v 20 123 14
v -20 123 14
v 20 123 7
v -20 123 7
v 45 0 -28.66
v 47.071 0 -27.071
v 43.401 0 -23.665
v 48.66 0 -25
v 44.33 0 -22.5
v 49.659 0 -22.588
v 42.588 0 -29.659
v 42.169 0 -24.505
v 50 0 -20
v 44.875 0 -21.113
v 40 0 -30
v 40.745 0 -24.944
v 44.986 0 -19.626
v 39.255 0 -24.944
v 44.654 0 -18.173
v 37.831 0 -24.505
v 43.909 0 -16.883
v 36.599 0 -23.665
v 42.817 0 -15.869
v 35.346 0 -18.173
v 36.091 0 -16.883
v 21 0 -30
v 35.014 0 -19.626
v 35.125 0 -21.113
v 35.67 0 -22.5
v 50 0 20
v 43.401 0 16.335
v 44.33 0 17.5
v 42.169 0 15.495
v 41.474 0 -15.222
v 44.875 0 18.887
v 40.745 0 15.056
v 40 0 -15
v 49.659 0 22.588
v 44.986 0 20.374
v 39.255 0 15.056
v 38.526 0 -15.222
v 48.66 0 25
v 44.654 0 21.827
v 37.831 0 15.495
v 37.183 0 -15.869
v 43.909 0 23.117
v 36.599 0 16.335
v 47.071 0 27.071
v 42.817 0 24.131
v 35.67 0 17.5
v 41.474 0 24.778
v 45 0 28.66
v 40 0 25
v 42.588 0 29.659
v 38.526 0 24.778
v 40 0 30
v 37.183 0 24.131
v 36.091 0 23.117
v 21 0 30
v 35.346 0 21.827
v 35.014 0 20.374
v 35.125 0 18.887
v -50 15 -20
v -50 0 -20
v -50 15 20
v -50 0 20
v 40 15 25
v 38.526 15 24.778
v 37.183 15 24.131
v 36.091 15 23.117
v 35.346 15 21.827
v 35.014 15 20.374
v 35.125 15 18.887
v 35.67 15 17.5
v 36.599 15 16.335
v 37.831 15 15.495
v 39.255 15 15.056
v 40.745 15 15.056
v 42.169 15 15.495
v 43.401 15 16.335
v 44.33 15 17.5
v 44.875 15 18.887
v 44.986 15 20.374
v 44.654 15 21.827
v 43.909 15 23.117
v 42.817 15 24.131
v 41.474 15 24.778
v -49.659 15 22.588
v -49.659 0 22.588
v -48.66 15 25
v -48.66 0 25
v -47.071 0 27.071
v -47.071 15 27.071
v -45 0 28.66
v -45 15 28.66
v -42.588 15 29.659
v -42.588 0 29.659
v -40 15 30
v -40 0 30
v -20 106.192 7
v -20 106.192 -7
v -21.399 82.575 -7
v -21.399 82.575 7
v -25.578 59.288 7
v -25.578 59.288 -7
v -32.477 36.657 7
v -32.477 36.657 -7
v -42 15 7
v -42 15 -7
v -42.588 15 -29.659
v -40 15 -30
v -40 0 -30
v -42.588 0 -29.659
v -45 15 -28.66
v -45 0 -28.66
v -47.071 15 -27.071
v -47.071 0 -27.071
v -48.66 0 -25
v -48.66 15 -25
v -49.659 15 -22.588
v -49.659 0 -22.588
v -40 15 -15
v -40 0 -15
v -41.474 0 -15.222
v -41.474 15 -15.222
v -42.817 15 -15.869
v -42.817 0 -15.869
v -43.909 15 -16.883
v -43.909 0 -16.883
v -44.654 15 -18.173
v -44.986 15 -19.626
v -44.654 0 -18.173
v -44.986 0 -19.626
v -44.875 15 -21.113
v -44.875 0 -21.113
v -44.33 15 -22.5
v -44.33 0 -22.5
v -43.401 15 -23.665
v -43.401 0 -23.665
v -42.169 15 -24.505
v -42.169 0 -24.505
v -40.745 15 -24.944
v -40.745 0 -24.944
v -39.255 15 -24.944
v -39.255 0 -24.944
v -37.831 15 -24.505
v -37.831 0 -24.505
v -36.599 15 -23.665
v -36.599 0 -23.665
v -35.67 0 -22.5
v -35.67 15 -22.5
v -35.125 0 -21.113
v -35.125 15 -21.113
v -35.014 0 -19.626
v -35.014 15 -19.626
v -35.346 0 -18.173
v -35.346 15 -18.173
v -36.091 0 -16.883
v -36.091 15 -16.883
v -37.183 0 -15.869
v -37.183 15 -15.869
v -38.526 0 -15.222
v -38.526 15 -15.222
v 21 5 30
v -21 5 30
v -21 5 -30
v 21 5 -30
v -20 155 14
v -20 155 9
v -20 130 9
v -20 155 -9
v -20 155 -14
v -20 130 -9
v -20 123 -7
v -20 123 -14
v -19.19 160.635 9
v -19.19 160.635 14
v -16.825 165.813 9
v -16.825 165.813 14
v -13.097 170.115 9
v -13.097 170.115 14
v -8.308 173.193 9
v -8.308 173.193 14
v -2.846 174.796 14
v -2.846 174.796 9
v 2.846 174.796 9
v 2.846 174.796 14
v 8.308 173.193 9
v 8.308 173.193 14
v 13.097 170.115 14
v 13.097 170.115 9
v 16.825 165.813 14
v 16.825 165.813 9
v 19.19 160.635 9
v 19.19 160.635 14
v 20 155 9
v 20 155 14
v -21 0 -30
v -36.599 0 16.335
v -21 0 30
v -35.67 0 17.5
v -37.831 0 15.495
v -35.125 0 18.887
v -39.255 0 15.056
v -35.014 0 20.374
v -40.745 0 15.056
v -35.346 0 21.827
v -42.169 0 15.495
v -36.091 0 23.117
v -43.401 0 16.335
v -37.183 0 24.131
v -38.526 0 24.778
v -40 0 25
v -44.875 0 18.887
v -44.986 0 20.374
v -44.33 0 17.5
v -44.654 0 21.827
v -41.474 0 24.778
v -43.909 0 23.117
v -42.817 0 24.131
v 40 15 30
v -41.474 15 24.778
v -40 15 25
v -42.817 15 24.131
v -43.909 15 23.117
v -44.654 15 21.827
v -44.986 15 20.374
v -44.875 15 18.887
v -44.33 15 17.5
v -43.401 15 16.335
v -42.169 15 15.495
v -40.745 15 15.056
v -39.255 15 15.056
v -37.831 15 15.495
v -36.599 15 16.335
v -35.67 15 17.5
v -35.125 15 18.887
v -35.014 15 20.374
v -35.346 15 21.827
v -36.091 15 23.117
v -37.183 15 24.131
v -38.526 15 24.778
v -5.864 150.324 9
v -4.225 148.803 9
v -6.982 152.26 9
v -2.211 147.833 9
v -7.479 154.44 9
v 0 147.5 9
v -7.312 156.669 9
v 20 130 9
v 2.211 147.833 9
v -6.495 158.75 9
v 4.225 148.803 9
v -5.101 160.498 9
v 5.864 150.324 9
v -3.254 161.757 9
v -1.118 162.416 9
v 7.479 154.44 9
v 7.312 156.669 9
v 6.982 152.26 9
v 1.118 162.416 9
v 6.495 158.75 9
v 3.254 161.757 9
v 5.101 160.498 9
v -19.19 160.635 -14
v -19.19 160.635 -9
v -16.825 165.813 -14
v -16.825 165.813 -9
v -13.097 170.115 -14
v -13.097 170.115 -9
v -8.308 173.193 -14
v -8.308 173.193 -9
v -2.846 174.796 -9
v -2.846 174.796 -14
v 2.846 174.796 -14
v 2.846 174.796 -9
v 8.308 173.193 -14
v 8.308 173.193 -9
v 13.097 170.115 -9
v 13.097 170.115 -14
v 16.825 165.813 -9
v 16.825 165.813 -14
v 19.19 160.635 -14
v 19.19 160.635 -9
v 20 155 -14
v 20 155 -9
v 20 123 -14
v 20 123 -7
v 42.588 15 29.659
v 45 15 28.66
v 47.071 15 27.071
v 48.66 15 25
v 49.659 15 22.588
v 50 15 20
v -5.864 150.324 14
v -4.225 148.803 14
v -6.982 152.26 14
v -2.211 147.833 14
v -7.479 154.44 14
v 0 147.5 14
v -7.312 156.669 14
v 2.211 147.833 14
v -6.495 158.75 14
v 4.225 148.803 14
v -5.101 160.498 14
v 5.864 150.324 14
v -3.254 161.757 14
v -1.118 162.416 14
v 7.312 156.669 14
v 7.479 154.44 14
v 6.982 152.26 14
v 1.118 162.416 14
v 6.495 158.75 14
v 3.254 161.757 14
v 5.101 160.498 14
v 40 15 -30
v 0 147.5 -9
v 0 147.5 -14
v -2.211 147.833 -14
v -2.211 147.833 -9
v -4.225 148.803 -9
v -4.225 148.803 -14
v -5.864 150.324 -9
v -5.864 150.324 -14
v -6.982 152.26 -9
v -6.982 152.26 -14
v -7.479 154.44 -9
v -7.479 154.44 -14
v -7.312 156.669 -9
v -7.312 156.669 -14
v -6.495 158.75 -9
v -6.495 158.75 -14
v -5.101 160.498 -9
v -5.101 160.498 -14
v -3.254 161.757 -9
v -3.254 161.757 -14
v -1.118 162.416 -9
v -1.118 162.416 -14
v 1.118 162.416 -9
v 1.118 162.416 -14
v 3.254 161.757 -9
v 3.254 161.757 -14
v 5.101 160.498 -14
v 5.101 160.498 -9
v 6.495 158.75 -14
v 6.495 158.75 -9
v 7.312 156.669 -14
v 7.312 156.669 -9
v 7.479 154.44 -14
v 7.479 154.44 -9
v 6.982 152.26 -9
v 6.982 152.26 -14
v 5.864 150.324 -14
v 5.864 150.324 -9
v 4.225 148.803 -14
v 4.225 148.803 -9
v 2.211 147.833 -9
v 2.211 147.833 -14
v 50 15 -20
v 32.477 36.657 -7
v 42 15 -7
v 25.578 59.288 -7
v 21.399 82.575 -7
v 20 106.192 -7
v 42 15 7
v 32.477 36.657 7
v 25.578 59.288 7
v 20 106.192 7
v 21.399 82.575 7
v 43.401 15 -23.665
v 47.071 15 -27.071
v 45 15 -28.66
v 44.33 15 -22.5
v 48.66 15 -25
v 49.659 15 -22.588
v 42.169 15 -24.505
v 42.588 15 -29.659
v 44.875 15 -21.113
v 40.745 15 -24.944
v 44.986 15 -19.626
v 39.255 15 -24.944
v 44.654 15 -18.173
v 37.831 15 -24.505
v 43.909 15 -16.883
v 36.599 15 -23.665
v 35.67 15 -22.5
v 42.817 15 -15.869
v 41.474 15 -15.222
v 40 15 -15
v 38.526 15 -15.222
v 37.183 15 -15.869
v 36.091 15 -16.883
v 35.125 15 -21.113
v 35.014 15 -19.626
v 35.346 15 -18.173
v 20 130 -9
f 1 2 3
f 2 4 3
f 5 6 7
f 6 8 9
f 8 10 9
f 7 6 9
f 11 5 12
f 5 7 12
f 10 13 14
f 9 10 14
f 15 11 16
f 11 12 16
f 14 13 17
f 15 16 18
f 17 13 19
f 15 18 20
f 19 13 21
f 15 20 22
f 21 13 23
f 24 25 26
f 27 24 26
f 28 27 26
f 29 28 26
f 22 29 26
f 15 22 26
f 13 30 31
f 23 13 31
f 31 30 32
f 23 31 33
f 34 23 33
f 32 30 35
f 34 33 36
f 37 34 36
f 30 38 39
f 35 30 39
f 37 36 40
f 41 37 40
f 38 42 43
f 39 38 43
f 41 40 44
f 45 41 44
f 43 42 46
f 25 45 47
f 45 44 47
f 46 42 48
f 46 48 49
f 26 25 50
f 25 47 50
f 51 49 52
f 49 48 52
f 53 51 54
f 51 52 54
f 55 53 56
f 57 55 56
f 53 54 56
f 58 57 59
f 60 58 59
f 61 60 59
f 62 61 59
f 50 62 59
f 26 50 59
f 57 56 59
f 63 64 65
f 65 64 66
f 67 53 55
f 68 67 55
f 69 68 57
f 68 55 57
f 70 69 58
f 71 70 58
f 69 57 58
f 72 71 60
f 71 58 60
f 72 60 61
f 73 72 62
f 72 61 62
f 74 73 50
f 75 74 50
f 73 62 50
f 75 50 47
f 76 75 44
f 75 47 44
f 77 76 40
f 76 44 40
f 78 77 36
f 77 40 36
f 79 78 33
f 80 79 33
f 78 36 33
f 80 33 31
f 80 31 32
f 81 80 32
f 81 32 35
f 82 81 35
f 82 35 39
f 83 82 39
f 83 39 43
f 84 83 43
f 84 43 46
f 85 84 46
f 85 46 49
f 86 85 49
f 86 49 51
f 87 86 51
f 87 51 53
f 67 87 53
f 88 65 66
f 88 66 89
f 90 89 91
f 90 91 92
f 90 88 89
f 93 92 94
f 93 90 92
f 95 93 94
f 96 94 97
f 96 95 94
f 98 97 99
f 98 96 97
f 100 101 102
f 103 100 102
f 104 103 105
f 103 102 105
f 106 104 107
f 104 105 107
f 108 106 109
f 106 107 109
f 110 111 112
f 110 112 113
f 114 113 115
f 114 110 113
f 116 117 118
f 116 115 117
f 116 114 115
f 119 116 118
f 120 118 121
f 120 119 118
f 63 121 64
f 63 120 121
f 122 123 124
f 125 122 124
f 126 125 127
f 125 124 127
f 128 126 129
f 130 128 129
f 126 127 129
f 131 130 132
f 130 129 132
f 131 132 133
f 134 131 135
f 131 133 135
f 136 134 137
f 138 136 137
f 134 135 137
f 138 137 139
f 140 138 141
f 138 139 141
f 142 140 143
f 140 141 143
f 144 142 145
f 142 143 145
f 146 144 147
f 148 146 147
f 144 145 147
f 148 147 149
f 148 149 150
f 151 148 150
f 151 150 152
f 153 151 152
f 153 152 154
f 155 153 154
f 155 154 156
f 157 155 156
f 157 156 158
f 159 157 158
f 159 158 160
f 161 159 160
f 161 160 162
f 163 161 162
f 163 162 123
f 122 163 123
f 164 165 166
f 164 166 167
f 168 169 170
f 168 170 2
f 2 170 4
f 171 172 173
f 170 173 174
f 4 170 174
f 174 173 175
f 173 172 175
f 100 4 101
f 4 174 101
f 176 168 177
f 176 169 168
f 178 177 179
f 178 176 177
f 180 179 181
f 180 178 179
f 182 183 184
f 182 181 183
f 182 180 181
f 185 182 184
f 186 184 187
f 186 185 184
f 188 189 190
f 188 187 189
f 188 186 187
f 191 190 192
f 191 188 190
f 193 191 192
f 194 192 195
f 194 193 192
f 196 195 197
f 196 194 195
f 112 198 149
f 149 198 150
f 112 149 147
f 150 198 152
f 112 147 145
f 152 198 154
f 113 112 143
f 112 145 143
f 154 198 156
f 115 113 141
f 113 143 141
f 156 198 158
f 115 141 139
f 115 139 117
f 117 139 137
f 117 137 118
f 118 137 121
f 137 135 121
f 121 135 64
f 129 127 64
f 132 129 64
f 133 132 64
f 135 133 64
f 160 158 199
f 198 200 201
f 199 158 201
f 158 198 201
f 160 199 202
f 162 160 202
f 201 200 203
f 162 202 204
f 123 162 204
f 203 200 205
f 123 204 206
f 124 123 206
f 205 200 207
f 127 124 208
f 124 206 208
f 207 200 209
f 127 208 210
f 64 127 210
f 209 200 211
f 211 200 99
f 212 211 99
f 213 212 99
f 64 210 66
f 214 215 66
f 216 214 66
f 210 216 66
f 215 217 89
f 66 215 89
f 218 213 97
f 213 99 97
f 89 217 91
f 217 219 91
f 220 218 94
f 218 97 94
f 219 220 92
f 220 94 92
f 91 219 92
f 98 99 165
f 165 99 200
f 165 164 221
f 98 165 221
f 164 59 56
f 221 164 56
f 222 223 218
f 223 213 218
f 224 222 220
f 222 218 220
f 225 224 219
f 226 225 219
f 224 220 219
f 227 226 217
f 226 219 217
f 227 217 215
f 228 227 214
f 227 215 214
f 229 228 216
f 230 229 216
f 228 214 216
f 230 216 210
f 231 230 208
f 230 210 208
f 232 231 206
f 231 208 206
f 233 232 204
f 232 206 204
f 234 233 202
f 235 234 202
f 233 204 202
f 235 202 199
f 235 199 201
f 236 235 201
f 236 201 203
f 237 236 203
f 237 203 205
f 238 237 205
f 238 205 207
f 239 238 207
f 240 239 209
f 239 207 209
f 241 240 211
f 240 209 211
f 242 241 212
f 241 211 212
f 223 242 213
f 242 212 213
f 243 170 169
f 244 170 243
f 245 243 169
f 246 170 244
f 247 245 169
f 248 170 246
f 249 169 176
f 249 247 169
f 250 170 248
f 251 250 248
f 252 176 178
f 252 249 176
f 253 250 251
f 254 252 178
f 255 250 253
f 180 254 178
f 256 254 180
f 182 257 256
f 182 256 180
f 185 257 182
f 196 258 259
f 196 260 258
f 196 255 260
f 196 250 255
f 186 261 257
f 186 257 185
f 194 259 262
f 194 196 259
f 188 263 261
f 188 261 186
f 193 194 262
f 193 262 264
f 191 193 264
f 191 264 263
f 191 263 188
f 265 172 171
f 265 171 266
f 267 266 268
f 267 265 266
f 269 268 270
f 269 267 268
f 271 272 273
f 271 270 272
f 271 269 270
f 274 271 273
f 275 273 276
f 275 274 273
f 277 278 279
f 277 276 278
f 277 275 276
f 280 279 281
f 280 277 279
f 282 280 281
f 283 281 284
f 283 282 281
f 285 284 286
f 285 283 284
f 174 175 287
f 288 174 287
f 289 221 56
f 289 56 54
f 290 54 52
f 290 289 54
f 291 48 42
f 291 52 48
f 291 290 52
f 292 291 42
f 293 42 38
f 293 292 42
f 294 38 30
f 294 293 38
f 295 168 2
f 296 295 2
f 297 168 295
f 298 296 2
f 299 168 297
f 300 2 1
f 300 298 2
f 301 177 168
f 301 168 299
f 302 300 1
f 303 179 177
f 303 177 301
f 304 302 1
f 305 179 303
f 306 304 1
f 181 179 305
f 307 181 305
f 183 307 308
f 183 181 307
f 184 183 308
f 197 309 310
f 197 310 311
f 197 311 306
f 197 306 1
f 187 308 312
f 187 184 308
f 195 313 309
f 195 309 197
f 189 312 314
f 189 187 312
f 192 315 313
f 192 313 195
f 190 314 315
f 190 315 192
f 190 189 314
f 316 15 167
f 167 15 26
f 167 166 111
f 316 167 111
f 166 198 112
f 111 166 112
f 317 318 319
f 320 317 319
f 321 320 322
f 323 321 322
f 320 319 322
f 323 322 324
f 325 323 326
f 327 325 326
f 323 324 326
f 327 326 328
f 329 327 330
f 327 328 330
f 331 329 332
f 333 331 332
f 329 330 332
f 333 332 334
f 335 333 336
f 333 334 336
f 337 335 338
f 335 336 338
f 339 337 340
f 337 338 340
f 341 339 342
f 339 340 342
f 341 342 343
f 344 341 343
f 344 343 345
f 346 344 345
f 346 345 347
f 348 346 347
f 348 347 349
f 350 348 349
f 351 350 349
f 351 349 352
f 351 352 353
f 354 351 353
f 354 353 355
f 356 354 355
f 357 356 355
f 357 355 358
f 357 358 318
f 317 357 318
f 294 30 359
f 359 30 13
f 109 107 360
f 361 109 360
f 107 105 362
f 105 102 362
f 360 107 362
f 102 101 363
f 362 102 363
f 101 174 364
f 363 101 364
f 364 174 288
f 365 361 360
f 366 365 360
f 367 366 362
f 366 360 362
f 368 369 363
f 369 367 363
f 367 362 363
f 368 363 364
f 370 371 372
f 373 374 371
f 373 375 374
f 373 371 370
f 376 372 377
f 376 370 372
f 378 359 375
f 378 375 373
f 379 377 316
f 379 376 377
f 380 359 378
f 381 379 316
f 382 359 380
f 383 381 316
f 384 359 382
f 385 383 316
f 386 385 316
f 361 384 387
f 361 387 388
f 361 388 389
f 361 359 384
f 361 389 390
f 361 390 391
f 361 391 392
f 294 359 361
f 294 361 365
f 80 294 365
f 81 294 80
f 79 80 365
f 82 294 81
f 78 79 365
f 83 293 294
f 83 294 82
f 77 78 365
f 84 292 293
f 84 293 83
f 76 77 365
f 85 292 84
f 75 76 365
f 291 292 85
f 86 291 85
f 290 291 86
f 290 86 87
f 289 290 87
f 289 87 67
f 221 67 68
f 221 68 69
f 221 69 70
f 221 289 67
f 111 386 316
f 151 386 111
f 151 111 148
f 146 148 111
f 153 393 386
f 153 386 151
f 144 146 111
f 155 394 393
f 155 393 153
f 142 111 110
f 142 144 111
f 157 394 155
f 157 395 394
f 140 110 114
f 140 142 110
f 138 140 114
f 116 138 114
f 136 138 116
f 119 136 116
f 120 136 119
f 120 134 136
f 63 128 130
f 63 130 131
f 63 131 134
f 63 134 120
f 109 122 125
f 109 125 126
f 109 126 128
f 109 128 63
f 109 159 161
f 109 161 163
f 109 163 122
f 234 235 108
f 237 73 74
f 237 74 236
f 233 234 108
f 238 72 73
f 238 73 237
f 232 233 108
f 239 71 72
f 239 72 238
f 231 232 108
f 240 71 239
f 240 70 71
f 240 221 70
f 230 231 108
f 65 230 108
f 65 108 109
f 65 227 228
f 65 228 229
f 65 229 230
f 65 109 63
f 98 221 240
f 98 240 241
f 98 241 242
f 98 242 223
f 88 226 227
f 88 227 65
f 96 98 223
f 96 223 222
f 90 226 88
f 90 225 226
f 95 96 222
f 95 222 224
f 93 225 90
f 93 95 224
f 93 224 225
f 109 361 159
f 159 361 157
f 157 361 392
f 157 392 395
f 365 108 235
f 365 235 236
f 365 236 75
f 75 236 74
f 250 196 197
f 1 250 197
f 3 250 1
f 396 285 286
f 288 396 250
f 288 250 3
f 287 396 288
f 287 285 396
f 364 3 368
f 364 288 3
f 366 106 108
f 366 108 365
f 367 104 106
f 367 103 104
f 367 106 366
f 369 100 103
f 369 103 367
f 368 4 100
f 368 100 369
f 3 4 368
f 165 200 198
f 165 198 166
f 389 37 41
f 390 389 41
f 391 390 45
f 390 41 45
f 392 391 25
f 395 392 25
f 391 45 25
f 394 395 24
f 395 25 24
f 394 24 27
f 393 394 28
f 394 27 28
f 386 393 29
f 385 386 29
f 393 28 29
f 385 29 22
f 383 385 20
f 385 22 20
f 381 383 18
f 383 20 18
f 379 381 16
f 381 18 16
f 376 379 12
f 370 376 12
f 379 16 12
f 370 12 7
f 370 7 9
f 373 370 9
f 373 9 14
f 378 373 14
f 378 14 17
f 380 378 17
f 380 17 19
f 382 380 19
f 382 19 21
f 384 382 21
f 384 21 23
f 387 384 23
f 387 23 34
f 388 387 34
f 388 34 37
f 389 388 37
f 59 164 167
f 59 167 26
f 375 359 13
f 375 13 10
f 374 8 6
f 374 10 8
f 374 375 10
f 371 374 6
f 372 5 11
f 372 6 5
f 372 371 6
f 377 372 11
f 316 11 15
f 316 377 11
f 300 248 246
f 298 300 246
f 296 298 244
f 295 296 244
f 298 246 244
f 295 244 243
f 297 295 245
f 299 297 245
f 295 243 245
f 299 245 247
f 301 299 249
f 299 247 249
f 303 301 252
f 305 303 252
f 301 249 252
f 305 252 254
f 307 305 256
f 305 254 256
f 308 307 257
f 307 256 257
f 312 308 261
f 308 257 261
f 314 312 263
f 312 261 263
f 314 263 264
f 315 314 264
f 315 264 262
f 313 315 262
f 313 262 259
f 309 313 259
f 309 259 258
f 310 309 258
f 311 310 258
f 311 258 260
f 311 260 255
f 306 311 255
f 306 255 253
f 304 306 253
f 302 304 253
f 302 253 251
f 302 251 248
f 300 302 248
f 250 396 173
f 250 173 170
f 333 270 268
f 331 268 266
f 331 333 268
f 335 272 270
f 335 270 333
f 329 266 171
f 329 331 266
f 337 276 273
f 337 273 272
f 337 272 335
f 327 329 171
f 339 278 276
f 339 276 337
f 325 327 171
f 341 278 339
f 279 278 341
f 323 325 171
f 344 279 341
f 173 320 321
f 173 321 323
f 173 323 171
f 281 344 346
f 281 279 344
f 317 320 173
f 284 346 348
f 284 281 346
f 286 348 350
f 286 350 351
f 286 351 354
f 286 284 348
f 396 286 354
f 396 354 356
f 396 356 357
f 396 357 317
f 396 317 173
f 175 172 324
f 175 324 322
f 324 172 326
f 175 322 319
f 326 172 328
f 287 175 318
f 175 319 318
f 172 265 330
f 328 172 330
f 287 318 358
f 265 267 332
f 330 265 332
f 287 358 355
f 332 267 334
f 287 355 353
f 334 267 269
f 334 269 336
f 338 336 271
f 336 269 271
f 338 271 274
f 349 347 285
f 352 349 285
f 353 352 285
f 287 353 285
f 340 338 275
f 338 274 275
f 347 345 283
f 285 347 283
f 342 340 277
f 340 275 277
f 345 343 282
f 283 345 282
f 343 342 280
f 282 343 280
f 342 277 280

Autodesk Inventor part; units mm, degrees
ref_plane "YZ Plane" through (0, 0, 0) normal (1, 0, 0) x (0, 1, 0)
ref_plane "XZ Plane" through (0, 0, 0) normal (0, 1, 0) x (-1, 0, 0)
ref_plane "XY Plane" through (0, 0, 0) normal (0, 0, 1) x (1, 0, 0)
sketch "Sketch1" plane through (0, 0, 0) normal (0, 1, 0) x (-1, 0, 0)
  line L0 (50, 30) -> (-50, 30)
  line L1 (-50, 30) -> (-50, -30)
  line L2 (-50, -30) -> (50, -30)
  line L3 (50, -30) -> (50, 30)
  line L4 (50, 30) -> (-50, -30) construction
  line L5 (-50, 30) -> (50, -30) construction
  point P0 (0, 0)
  dimension "d0" = 100
  dimension "d1" = 60
extrude "Extrusion1" add sketch "Sketch1" along normal blind 15
fillet "Fillet1" radius 10 4 edges at (50, 7.5, -30) (-50, 7.5, -30) (-50, 7.5, 30) (50, 7.5, 30)
sketch "Sketch2" plane through (0, 0, 0) normal (0, 0, 1) x (1, 0, 0)
  line L0 (40, 0) -> (-40, 0) projected
  arc A0 (20, 155) -> (-20, 155) centre (0, 155) ccw
  line L1 (-20, 155) -> (-20, 106.1921)
  arc A1 (-42, 15) -> (-20, 106.1921) centre (-220, 106.1921) ccw
  line L2 (40, 15) -> (-40, 15) projected
  line L3 (0, 155) -> (0, -9.0216)
  line L4 (20, 155) -> (20, 106.1921)
  arc A2 (20, 106.1921) -> (42, 15) centre (220, 106.1921) ccw
  line L5 (-42, 15) -> (42, 15)
  line L6 (-50, 15) -> (-40, 15) projected
  point P0 (0, 0)
  point P1 (0, 0)
  dimension "d5" = 20
  dimension "d6" = 155
  dimension "d7" = 84
  dimension "d8" = 200
extrude "Extrusion2" add sketch "Sketch2" along normal mid plane 14
sketch "Sketch3" plane through (0, 0, 0) normal (0, 0, 1) x (1, 0, 0)
  line L0 (-20, 106.1921) -> (-20, 155) projected
  line L1 (-20, 123) -> (20, 123)
  line L2 (20, 155) -> (20, 106.1921) projected
  arc A0 (20, 155) -> (-20, 155) centre (0, 155) ccw projected
  line L3 (-20, 155) -> (-20, 123)
  line L4 (20, 123) -> (20, 155)
  point P0 (0, 0)
  dimension "d11" = 32
extrude "Extrusion3" add sketch "Sketch3" along normal mid plane 28
sketch "Sketch4" plane through (20, 106.1921, 7) normal (1, 0, 0) x (0, 0, -1)
  line L0 (0, 0) -> (14, 0) projected
  line L1 (21, 48.8079) -> (-7, 48.8079) projected
  line L2 (-2, 68.8079) -> (16, 68.8079)
  line L3 (16, 68.8079) -> (16, 23.8079)
  line L4 (16, 23.8079) -> (-2, 23.8079)
  line L5 (-2, 23.8079) -> (-2, 68.8079)
  line L6 (21, 68.8079) -> (-7, 68.8079) projected
  point P0 (7, -106.1921)
  point P1 (7, 23.8079)
  point P2 (7, 0)
  dimension "d14" = 25
  dimension "d15" = 18
extrude "Extrusion4" cut sketch "Sketch4" against normal through all
sketch "Sketch5" plane through (-40, 0, 30) normal (0, 0, 1) x (1, 0, 0)
  line L0 (0, 0) -> (80, 0) projected
  line L1 (19, 5) -> (61, 5)
  line L2 (61, 5) -> (61, 0)
  line L3 (61, 0) -> (19, 0)
  line L4 (19, 0) -> (19, 5)
  point P0 (40, 0)
  point P1 (40, 0)
  point P2 (61, 0)
  dimension "d18" = 42
  dimension "d19" = 5
extrude "Extrusion5" cut sketch "Sketch5" against normal through all
sketch "Sketch6" plane through (0, 0, 14) normal (0, 0, 1) x (1, 0, 0)
  arc A0 (20, 155) -> (-20, 155) centre (0, 155) ccw projected
  point P0 (0, 0)
hole "Hole1" at (0, 155, 14) direction (0, 0, -1) diameter 15 end through all
sketch "Sketch7" plane through (0, 15, 0) normal (0, 1, 0) x (1, 0, 0)
  arc A0 (40, -30) -> (50, -20) centre (40, -20) ccw projected
  arc A1 (50, 20) -> (40, 30) centre (40, 20) ccw projected
  arc A2 (-40, 30) -> (-50, 20) centre (-40, 20) ccw projected
  arc A3 (-50, -20) -> (-40, -30) centre (-40, -20) ccw projected
  point P0 (0, 0)
hole "Hole2" at (-40, 15, -20) at (-40, 15, 20) at (40, 15, -20) at (40, 15, 20) direction (0, -1, 0) diameter 10 end through all
properties part number "Part012. HighStand" material "Steel, Cast"
